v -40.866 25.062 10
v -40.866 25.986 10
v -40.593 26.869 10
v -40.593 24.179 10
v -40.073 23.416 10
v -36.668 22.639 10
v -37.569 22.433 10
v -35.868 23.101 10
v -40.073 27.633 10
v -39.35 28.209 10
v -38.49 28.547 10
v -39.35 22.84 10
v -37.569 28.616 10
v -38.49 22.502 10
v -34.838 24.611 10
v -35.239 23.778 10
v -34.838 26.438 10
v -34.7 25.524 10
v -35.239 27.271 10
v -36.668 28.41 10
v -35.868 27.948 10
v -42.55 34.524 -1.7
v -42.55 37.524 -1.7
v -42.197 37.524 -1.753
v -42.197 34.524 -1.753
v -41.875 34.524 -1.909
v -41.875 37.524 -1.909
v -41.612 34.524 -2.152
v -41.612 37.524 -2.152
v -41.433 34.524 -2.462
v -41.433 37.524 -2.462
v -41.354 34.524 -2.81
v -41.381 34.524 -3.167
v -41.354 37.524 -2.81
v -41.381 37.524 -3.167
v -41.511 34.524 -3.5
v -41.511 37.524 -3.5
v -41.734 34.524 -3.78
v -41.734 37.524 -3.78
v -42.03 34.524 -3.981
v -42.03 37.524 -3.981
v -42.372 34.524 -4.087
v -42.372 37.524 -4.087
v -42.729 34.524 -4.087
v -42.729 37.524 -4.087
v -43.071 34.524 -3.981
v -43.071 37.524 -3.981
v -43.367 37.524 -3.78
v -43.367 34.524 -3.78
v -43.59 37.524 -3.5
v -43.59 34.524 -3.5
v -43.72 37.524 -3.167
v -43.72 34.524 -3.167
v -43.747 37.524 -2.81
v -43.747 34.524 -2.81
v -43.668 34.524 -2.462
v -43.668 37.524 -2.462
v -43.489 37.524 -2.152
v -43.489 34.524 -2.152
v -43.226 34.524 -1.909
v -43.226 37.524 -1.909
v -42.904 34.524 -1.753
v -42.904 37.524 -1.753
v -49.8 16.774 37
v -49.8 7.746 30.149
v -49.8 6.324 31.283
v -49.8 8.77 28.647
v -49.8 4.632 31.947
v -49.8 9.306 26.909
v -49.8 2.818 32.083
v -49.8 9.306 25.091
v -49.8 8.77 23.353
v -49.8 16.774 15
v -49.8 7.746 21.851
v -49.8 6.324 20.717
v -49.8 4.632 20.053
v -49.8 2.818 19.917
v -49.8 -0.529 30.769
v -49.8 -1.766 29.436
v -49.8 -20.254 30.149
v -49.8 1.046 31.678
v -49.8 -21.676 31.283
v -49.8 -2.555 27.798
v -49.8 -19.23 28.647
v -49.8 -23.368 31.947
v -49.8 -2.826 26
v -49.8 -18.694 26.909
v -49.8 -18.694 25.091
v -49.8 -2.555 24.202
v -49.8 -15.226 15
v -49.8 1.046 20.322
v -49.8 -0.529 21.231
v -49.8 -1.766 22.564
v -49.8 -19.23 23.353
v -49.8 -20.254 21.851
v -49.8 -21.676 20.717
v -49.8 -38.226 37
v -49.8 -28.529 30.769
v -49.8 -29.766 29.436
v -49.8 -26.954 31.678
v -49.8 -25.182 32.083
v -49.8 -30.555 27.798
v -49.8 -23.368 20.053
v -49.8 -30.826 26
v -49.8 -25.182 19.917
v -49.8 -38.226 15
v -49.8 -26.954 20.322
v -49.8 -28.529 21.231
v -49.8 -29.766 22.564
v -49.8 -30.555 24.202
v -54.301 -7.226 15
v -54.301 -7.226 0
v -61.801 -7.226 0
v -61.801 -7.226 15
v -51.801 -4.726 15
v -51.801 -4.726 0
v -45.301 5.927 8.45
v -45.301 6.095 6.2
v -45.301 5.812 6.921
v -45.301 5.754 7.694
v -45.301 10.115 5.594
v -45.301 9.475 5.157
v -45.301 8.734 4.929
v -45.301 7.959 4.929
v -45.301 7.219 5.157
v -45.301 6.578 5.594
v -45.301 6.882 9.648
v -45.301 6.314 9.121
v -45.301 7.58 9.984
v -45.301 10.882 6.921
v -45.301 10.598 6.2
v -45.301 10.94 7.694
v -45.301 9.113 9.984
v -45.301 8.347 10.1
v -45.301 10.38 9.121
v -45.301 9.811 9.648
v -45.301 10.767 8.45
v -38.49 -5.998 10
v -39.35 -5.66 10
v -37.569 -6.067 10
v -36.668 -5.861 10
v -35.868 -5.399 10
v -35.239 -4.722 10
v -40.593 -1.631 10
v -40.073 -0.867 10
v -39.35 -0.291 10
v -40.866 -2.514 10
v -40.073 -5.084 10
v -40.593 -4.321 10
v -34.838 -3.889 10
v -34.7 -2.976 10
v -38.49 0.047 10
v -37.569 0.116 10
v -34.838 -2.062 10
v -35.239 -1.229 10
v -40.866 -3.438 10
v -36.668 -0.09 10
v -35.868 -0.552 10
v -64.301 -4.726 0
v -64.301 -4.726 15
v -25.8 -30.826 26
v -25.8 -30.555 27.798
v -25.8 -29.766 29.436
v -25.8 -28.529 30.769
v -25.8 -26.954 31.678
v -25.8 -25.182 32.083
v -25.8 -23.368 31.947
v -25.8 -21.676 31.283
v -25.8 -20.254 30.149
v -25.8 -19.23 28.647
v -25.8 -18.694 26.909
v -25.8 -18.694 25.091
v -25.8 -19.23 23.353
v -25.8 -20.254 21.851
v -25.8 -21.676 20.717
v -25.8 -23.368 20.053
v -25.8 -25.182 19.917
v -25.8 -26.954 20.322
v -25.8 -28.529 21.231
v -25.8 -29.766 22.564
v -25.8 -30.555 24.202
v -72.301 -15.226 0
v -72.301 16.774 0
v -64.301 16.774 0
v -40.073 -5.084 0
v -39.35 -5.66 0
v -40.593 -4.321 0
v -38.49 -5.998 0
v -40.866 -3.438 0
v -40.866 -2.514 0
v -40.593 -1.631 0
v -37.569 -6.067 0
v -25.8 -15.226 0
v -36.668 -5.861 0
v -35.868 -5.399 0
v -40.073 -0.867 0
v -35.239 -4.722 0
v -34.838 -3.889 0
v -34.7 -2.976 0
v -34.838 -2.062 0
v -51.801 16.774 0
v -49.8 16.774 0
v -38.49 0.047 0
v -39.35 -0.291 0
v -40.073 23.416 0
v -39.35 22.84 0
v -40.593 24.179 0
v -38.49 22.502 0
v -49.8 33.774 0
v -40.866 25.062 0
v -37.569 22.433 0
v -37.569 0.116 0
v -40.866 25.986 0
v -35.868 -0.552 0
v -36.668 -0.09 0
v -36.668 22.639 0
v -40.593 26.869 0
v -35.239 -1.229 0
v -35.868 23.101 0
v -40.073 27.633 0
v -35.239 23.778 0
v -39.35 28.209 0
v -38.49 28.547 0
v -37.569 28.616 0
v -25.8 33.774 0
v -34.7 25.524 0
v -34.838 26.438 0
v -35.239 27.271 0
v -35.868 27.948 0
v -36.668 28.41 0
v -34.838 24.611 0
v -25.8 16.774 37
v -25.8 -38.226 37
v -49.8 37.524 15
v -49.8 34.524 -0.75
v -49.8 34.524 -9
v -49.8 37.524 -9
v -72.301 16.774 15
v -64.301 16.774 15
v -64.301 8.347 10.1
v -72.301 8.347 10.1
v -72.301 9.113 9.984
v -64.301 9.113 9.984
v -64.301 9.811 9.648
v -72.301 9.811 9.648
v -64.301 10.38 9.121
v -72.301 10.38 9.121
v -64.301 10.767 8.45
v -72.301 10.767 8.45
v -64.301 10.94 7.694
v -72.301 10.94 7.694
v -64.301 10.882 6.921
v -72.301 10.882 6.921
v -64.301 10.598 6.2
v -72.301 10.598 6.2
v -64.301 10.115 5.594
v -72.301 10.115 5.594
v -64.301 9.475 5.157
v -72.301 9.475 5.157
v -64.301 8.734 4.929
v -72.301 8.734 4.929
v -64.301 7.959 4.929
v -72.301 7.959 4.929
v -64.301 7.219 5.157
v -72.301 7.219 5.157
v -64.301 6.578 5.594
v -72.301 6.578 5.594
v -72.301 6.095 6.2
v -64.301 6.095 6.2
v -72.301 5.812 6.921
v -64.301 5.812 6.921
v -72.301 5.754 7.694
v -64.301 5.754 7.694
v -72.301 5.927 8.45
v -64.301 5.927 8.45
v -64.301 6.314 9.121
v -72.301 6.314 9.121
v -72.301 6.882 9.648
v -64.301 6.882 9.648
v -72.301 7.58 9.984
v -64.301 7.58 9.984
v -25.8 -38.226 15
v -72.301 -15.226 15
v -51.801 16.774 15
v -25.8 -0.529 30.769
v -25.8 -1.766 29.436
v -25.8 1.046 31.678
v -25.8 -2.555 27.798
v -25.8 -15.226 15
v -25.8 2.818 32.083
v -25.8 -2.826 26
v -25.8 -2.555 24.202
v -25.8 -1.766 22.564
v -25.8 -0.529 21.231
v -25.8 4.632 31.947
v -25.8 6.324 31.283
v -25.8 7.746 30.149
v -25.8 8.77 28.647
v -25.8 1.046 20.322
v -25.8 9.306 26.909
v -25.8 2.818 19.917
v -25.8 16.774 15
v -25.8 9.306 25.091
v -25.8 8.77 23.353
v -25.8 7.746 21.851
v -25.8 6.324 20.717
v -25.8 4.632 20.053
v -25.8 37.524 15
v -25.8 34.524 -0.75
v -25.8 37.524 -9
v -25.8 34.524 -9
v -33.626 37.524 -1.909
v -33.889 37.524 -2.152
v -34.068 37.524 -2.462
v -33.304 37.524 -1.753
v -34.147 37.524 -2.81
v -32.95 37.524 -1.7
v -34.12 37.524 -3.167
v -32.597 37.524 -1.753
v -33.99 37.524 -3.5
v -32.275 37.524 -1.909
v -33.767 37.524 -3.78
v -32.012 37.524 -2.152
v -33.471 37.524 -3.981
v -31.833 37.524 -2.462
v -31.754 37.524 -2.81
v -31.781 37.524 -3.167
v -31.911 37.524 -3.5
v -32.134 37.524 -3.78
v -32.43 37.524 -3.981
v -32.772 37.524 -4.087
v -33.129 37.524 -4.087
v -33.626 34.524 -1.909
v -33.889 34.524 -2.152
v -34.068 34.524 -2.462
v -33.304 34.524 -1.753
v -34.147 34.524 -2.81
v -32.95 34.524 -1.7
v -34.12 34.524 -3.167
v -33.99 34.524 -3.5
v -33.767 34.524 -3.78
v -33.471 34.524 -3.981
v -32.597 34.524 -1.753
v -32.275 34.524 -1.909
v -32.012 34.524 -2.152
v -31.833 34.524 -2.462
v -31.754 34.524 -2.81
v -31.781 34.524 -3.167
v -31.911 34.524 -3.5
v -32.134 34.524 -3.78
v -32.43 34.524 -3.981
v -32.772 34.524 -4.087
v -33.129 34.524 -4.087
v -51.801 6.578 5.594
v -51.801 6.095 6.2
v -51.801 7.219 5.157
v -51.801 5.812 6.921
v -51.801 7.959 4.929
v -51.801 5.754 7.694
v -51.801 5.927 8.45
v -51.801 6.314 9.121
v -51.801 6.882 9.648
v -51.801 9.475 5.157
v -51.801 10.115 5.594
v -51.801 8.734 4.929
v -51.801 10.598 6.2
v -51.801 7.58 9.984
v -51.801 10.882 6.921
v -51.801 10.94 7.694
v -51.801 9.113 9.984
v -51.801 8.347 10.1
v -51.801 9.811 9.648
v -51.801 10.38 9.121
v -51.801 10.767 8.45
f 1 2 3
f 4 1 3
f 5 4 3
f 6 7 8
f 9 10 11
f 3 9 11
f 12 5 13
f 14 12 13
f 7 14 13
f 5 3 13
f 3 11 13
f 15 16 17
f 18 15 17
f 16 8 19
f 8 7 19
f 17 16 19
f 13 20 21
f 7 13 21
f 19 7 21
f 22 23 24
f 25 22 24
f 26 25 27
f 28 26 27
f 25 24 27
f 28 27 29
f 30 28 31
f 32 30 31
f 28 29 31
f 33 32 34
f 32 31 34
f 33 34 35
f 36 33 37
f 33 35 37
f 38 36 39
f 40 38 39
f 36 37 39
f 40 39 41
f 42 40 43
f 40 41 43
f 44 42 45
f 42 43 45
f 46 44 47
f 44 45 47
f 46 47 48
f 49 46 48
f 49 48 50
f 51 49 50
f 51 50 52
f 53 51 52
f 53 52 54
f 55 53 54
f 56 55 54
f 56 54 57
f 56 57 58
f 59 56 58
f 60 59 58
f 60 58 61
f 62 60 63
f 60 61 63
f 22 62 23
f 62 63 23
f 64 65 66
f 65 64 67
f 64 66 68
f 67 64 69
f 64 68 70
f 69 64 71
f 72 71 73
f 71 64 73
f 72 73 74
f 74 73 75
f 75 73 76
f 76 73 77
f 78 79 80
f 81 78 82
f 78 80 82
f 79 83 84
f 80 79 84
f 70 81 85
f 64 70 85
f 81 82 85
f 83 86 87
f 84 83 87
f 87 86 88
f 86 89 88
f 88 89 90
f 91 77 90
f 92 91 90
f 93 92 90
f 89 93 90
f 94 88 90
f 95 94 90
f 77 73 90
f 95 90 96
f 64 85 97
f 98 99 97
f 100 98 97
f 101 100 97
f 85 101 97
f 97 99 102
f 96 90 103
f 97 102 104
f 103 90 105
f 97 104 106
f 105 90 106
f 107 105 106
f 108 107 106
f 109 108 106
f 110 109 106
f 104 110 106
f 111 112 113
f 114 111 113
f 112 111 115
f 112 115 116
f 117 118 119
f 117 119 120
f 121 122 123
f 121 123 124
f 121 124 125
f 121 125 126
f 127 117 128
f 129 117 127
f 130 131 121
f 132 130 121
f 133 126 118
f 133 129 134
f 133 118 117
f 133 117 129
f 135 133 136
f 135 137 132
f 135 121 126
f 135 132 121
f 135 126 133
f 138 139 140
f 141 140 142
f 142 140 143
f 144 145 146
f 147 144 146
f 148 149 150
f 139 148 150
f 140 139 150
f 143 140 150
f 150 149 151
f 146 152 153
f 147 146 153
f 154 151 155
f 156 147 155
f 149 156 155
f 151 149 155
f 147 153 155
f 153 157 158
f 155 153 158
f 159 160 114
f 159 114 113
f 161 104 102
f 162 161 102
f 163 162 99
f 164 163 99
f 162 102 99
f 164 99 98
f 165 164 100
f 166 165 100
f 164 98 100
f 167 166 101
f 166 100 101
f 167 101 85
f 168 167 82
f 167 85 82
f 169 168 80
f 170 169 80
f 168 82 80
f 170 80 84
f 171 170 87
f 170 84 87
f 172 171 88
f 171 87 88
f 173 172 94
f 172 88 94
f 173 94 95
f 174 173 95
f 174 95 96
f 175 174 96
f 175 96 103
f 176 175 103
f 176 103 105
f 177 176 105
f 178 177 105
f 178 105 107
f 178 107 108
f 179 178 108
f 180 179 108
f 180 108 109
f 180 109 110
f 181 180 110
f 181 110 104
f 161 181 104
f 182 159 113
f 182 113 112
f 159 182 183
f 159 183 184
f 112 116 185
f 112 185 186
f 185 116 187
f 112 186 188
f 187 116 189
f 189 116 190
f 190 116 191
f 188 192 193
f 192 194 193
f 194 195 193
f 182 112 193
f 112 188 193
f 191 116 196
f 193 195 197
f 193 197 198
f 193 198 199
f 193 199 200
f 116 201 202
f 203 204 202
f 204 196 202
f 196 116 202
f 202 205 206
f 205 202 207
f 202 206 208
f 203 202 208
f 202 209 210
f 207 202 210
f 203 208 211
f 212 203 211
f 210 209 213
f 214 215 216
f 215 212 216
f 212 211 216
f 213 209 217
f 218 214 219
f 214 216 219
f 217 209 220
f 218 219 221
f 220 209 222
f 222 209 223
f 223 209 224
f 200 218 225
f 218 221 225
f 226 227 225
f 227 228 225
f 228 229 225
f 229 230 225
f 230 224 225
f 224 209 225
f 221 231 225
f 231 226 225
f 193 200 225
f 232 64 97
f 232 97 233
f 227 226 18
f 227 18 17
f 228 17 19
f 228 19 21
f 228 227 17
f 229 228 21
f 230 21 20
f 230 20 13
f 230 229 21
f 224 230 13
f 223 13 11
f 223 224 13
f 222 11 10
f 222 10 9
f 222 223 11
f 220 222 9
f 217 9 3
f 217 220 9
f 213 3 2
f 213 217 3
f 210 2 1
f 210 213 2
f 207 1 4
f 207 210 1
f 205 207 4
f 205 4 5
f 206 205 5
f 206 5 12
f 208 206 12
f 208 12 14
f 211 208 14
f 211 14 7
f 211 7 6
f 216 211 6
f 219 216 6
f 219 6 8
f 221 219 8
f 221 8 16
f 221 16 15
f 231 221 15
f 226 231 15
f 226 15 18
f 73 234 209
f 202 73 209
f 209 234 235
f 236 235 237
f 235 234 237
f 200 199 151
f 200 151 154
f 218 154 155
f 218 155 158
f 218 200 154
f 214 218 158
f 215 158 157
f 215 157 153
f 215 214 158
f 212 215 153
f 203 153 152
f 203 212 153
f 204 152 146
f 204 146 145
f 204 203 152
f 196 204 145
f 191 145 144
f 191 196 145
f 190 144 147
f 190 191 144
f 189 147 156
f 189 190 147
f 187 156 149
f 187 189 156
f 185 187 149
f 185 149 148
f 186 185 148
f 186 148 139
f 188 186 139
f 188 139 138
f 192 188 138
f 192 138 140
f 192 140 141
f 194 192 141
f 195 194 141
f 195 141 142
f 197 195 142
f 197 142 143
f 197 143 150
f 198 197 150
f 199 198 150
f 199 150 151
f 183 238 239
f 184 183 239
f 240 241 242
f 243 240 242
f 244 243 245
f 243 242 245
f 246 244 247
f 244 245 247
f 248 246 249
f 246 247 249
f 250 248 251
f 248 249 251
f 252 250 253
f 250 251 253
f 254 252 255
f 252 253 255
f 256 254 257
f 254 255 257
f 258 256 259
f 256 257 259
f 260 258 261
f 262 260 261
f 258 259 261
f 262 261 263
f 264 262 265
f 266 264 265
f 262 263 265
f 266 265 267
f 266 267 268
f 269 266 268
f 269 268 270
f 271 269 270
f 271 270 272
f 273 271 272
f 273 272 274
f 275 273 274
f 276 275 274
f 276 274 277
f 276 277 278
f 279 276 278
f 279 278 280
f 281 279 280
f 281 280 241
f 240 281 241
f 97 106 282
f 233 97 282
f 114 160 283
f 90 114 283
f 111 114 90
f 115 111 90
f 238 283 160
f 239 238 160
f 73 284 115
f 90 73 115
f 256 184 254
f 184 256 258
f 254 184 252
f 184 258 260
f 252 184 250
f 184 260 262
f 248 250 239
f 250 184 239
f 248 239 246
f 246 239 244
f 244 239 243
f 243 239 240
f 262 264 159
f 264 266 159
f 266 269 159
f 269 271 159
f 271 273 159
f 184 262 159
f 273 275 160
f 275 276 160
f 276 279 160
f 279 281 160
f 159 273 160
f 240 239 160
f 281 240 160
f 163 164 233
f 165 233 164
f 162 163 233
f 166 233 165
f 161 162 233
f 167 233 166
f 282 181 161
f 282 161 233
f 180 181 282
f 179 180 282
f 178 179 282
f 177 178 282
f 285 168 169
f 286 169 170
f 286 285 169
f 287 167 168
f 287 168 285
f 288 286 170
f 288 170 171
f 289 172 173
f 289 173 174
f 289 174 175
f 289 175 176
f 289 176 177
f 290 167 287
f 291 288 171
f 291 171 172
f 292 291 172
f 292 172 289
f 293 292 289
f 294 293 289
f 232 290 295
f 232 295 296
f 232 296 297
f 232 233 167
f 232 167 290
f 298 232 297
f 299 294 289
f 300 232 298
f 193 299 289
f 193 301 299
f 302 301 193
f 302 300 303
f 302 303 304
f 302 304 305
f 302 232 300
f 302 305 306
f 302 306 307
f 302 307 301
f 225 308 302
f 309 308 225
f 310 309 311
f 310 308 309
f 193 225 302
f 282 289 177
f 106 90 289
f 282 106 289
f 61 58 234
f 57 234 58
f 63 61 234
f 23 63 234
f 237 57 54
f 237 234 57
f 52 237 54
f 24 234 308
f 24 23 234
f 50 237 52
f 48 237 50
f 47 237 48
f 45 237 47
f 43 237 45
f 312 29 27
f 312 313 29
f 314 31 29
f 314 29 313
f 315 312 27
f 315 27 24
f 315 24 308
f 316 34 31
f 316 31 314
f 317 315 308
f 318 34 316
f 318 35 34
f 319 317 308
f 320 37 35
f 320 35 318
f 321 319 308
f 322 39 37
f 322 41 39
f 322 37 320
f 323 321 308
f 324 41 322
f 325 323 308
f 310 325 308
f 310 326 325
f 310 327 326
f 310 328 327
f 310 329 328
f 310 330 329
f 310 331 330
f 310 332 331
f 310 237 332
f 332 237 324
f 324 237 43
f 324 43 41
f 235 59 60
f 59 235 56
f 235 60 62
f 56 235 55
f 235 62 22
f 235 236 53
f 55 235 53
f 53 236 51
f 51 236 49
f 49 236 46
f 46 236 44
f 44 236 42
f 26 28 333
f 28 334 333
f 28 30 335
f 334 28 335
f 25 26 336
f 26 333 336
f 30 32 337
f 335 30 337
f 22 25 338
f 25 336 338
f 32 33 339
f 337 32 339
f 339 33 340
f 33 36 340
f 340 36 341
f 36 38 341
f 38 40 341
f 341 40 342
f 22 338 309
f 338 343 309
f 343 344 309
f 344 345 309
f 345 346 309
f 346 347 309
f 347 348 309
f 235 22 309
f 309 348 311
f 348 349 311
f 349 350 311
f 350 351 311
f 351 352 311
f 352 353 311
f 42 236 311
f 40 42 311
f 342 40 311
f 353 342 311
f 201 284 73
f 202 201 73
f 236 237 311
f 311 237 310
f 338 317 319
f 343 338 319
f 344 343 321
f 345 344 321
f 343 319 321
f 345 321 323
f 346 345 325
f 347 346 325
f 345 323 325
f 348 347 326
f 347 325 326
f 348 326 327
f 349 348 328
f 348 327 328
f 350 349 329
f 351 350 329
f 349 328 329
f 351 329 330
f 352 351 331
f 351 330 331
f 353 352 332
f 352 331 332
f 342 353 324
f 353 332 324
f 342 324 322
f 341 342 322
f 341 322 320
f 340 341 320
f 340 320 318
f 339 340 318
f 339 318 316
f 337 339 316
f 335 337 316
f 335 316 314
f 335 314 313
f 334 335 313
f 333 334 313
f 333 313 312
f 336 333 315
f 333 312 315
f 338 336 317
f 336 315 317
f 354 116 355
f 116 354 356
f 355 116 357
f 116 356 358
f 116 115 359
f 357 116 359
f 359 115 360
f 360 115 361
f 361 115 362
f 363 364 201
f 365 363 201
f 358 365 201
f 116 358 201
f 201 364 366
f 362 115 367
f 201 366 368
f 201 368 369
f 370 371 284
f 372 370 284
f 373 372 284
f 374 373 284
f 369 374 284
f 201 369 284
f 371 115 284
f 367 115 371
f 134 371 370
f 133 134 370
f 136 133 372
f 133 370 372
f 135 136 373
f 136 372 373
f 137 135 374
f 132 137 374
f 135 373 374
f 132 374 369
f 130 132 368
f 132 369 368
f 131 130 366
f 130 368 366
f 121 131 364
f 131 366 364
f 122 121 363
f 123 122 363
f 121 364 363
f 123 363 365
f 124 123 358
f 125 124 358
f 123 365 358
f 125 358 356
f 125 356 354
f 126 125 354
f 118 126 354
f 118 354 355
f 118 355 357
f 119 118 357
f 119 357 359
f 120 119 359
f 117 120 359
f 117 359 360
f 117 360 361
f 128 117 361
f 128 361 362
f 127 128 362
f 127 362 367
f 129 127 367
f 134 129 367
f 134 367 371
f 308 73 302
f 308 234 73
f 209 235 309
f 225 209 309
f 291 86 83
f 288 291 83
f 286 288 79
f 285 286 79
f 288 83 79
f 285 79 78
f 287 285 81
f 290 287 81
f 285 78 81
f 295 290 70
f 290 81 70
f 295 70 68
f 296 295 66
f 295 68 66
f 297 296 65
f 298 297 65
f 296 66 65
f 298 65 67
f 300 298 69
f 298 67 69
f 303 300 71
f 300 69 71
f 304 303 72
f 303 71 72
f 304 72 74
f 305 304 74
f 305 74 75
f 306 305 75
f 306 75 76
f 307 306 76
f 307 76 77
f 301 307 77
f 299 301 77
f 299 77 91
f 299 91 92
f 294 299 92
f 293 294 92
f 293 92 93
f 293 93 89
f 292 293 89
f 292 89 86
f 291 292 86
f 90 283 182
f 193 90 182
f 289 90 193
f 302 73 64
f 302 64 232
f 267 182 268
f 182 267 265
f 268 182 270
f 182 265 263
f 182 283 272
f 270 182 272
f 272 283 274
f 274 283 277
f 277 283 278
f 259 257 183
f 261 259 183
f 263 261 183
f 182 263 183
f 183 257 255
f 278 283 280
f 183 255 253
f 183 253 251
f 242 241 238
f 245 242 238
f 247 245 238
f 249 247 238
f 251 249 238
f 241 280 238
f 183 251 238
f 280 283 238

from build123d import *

# Parameters (mm, degrees)
SKETCH1_R           = 3.1
SKETCH1_R_2         = 2.5
BOSS_EXTRUDE1_DEPTH = 15
BOSS_EXTRUDE3_START = -5
SKETCH6_R           = 3.1
BOSS_EXTRUDE3_DEPTH = 5
BOSS_EXTRUDE4_DEPTH = 15
SKETCH8_R           = 2.6
CUT_EXTRUDE3_DEPTH  = 27
CUT_EXTRUDE4_DEPTH  = 89.777895192
SKETCH11_W          = 24
SKETCH11_H          = 0.25
BOSS_EXTRUDE5_DEPTH = 15
SKETCH12_W          = 24
SKETCH12_H          = 32
SKETCH12_H_2        = 23
BOSS_EXTRUDE6_DEPTH = 22
SKETCH13_R          = 6.1
CUT_EXTRUDE5_DEPTH  = 59.362710124
SKETCH14_W          = 24
SKETCH14_H          = 9
SKETCH14_R          = 1.2
BOSS_EXTRUDE7_DEPTH = 3
CHAMFER1_SIZE       = 2.5
CHAMFER2_SIZE       = 0.75


with BuildPart() as part:
    # Sketch1 → Boss-Extrude1 (new body)
    with BuildSketch(Plane.XY):
        with BuildLine():
            Line((-25.80048806, 37.524276553), (-49.80048806, 37.524276553))
            Line((-49.80048806, 37.524276553), (-49.80048806, -14.975723447))
            Line((-49.80048806, -14.975723447), (-41.80048806, -45.286414829))
            ThreePointArc((-41.80048806, -45.286414829), (-37.80048806, -49.286414829), (-33.80048806, -45.286414829))
            Line((-33.80048806, -45.286414829), (-25.80048806, -14.975723447))
            Line((-25.80048806, -14.975723447), (-25.80048806, 37.524276553))
        make_face()
        with Locations((-37.80048806, 25.524276553)):
            Circle(SKETCH1_R, mode=Mode.SUBTRACT)
        with Locations((-37.80048806, -2.975723447)):
            Circle(SKETCH1_R, mode=Mode.SUBTRACT)
        with Locations((-37.80048806, -45.286414829)):
            Circle(SKETCH1_R_2, mode=Mode.SUBTRACT)
    extrude(amount=BOSS_EXTRUDE1_DEPTH)

    # Sketch6 → Boss-Extrude3 (add)
    with BuildSketch(Plane.XY.offset(15).offset(BOSS_EXTRUDE3_START)):
        with Locations((-37.80048806, -2.975723447)):
            Circle(SKETCH6_R)
        with Locations((-37.80048806, 25.524276553)):
            Circle(SKETCH6_R)
    extrude(amount=BOSS_EXTRUDE3_DEPTH)

    # Sketch7 → Boss-Extrude4 (add)
    with BuildSketch(Plane.XY.offset(15)):
        Polygon((-51.800511672, 16.774276553), (-49.80048806, 16.774276553), (-49.80048806, -15.225723447), (-72.300511672, -15.225723447), (-72.300511672, 16.774276553), (-64.300511672, 16.774276553), (-64.300511672, -7.225723447), (-58.050499866, -7.225723447), (-51.800511672, -7.225723447), align=None)
    extrude(amount=-BOSS_EXTRUDE4_DEPTH)

    # Sketch8 → Cut-Extrude3 (cut)
    with BuildSketch(Plane.ZY.offset(72.300511672)):
        with Locations((7.5, 8.346782821)):
            Circle(SKETCH8_R)
    extrude(amount=-CUT_EXTRUDE3_DEPTH, mode=Mode.SUBTRACT)

    # Sketch10 → Cut-Extrude4 (cut, through all)
    with BuildSketch(Plane.XY.offset(15)):
        Polygon((-49.80048806, -15.225723447), (-49.80048806, -14.975723447), (-25.80048806, -14.975723447), (-25.80048806, -50.615055613), (-49.80048806, -50.615055613), align=None)
    extrude(amount=-CUT_EXTRUDE4_DEPTH, mode=Mode.SUBTRACT)

    # Sketch11 → Boss-Extrude5 (add)
    with BuildSketch(Plane.XY.offset(15)):
        with Locations((-37.80048806, -15.100723447)):
            Rectangle(SKETCH11_W, SKETCH11_H)
    extrude(amount=-BOSS_EXTRUDE5_DEPTH)

    # Sketch12 → Boss-Extrude6 (add)
    with BuildSketch(Plane.XY.offset(15)):
        with Locations((-37.80048806, 0.774276553)):
            Rectangle(SKETCH12_W, SKETCH12_H)
        with Locations((-37.80048806, -26.725723447)):
            Rectangle(SKETCH12_W, SKETCH12_H_2)
    extrude(amount=BOSS_EXTRUDE6_DEPTH)

    # Sketch13 → Cut-Extrude5 (cut, through all)
    with BuildSketch(Plane.ZY.offset(49.80048806)):
        with Locations(Location((26, 3.274276553, 0), (0, 0, 270))):
            Circle(SKETCH13_R)
        with Locations(Location((26, -24.725723447, 0), (0, 0, 270))):
            Circle(SKETCH13_R)
    extrude(amount=-CUT_EXTRUDE5_DEPTH, mode=Mode.SUBTRACT)

    # Sketch14 → Boss-Extrude7 (add)
    with BuildSketch(Plane(origin=(0, 37.524276553, 0), x_dir=(1, 0, 0), z_dir=(0, 1, 0))):
        with Locations((-37.80048806, 4.5)):
            Rectangle(SKETCH14_W, SKETCH14_H)
        with Locations(Location((-32.95048806, 2.9, 0), (0, 0, 270))):
            Circle(SKETCH14_R, mode=Mode.SUBTRACT)
        with Locations(Location((-42.55048806, 2.9, 0), (0, 0, 270))):
            Circle(SKETCH14_R, mode=Mode.SUBTRACT)
    extrude(amount=-BOSS_EXTRUDE7_DEPTH)

    # Chamfer1
    chamfer1_edges = [part.edges().sort_by_distance(p)[0] for p in [
        (-64.300511672, -7.225723447, 7.5),
        (-51.800511672, -7.225723447, 7.5),
    ]]
    chamfer(chamfer1_edges, length=CHAMFER1_SIZE)

    # Chamfer2
    chamfer2_edges = [part.edges().sort_by_distance(p)[0] for p in [
        (-37.80048806, 34.524276553, 0),
    ]]
    chamfer(chamfer2_edges, length=CHAMFER2_SIZE)


solid = part.part
